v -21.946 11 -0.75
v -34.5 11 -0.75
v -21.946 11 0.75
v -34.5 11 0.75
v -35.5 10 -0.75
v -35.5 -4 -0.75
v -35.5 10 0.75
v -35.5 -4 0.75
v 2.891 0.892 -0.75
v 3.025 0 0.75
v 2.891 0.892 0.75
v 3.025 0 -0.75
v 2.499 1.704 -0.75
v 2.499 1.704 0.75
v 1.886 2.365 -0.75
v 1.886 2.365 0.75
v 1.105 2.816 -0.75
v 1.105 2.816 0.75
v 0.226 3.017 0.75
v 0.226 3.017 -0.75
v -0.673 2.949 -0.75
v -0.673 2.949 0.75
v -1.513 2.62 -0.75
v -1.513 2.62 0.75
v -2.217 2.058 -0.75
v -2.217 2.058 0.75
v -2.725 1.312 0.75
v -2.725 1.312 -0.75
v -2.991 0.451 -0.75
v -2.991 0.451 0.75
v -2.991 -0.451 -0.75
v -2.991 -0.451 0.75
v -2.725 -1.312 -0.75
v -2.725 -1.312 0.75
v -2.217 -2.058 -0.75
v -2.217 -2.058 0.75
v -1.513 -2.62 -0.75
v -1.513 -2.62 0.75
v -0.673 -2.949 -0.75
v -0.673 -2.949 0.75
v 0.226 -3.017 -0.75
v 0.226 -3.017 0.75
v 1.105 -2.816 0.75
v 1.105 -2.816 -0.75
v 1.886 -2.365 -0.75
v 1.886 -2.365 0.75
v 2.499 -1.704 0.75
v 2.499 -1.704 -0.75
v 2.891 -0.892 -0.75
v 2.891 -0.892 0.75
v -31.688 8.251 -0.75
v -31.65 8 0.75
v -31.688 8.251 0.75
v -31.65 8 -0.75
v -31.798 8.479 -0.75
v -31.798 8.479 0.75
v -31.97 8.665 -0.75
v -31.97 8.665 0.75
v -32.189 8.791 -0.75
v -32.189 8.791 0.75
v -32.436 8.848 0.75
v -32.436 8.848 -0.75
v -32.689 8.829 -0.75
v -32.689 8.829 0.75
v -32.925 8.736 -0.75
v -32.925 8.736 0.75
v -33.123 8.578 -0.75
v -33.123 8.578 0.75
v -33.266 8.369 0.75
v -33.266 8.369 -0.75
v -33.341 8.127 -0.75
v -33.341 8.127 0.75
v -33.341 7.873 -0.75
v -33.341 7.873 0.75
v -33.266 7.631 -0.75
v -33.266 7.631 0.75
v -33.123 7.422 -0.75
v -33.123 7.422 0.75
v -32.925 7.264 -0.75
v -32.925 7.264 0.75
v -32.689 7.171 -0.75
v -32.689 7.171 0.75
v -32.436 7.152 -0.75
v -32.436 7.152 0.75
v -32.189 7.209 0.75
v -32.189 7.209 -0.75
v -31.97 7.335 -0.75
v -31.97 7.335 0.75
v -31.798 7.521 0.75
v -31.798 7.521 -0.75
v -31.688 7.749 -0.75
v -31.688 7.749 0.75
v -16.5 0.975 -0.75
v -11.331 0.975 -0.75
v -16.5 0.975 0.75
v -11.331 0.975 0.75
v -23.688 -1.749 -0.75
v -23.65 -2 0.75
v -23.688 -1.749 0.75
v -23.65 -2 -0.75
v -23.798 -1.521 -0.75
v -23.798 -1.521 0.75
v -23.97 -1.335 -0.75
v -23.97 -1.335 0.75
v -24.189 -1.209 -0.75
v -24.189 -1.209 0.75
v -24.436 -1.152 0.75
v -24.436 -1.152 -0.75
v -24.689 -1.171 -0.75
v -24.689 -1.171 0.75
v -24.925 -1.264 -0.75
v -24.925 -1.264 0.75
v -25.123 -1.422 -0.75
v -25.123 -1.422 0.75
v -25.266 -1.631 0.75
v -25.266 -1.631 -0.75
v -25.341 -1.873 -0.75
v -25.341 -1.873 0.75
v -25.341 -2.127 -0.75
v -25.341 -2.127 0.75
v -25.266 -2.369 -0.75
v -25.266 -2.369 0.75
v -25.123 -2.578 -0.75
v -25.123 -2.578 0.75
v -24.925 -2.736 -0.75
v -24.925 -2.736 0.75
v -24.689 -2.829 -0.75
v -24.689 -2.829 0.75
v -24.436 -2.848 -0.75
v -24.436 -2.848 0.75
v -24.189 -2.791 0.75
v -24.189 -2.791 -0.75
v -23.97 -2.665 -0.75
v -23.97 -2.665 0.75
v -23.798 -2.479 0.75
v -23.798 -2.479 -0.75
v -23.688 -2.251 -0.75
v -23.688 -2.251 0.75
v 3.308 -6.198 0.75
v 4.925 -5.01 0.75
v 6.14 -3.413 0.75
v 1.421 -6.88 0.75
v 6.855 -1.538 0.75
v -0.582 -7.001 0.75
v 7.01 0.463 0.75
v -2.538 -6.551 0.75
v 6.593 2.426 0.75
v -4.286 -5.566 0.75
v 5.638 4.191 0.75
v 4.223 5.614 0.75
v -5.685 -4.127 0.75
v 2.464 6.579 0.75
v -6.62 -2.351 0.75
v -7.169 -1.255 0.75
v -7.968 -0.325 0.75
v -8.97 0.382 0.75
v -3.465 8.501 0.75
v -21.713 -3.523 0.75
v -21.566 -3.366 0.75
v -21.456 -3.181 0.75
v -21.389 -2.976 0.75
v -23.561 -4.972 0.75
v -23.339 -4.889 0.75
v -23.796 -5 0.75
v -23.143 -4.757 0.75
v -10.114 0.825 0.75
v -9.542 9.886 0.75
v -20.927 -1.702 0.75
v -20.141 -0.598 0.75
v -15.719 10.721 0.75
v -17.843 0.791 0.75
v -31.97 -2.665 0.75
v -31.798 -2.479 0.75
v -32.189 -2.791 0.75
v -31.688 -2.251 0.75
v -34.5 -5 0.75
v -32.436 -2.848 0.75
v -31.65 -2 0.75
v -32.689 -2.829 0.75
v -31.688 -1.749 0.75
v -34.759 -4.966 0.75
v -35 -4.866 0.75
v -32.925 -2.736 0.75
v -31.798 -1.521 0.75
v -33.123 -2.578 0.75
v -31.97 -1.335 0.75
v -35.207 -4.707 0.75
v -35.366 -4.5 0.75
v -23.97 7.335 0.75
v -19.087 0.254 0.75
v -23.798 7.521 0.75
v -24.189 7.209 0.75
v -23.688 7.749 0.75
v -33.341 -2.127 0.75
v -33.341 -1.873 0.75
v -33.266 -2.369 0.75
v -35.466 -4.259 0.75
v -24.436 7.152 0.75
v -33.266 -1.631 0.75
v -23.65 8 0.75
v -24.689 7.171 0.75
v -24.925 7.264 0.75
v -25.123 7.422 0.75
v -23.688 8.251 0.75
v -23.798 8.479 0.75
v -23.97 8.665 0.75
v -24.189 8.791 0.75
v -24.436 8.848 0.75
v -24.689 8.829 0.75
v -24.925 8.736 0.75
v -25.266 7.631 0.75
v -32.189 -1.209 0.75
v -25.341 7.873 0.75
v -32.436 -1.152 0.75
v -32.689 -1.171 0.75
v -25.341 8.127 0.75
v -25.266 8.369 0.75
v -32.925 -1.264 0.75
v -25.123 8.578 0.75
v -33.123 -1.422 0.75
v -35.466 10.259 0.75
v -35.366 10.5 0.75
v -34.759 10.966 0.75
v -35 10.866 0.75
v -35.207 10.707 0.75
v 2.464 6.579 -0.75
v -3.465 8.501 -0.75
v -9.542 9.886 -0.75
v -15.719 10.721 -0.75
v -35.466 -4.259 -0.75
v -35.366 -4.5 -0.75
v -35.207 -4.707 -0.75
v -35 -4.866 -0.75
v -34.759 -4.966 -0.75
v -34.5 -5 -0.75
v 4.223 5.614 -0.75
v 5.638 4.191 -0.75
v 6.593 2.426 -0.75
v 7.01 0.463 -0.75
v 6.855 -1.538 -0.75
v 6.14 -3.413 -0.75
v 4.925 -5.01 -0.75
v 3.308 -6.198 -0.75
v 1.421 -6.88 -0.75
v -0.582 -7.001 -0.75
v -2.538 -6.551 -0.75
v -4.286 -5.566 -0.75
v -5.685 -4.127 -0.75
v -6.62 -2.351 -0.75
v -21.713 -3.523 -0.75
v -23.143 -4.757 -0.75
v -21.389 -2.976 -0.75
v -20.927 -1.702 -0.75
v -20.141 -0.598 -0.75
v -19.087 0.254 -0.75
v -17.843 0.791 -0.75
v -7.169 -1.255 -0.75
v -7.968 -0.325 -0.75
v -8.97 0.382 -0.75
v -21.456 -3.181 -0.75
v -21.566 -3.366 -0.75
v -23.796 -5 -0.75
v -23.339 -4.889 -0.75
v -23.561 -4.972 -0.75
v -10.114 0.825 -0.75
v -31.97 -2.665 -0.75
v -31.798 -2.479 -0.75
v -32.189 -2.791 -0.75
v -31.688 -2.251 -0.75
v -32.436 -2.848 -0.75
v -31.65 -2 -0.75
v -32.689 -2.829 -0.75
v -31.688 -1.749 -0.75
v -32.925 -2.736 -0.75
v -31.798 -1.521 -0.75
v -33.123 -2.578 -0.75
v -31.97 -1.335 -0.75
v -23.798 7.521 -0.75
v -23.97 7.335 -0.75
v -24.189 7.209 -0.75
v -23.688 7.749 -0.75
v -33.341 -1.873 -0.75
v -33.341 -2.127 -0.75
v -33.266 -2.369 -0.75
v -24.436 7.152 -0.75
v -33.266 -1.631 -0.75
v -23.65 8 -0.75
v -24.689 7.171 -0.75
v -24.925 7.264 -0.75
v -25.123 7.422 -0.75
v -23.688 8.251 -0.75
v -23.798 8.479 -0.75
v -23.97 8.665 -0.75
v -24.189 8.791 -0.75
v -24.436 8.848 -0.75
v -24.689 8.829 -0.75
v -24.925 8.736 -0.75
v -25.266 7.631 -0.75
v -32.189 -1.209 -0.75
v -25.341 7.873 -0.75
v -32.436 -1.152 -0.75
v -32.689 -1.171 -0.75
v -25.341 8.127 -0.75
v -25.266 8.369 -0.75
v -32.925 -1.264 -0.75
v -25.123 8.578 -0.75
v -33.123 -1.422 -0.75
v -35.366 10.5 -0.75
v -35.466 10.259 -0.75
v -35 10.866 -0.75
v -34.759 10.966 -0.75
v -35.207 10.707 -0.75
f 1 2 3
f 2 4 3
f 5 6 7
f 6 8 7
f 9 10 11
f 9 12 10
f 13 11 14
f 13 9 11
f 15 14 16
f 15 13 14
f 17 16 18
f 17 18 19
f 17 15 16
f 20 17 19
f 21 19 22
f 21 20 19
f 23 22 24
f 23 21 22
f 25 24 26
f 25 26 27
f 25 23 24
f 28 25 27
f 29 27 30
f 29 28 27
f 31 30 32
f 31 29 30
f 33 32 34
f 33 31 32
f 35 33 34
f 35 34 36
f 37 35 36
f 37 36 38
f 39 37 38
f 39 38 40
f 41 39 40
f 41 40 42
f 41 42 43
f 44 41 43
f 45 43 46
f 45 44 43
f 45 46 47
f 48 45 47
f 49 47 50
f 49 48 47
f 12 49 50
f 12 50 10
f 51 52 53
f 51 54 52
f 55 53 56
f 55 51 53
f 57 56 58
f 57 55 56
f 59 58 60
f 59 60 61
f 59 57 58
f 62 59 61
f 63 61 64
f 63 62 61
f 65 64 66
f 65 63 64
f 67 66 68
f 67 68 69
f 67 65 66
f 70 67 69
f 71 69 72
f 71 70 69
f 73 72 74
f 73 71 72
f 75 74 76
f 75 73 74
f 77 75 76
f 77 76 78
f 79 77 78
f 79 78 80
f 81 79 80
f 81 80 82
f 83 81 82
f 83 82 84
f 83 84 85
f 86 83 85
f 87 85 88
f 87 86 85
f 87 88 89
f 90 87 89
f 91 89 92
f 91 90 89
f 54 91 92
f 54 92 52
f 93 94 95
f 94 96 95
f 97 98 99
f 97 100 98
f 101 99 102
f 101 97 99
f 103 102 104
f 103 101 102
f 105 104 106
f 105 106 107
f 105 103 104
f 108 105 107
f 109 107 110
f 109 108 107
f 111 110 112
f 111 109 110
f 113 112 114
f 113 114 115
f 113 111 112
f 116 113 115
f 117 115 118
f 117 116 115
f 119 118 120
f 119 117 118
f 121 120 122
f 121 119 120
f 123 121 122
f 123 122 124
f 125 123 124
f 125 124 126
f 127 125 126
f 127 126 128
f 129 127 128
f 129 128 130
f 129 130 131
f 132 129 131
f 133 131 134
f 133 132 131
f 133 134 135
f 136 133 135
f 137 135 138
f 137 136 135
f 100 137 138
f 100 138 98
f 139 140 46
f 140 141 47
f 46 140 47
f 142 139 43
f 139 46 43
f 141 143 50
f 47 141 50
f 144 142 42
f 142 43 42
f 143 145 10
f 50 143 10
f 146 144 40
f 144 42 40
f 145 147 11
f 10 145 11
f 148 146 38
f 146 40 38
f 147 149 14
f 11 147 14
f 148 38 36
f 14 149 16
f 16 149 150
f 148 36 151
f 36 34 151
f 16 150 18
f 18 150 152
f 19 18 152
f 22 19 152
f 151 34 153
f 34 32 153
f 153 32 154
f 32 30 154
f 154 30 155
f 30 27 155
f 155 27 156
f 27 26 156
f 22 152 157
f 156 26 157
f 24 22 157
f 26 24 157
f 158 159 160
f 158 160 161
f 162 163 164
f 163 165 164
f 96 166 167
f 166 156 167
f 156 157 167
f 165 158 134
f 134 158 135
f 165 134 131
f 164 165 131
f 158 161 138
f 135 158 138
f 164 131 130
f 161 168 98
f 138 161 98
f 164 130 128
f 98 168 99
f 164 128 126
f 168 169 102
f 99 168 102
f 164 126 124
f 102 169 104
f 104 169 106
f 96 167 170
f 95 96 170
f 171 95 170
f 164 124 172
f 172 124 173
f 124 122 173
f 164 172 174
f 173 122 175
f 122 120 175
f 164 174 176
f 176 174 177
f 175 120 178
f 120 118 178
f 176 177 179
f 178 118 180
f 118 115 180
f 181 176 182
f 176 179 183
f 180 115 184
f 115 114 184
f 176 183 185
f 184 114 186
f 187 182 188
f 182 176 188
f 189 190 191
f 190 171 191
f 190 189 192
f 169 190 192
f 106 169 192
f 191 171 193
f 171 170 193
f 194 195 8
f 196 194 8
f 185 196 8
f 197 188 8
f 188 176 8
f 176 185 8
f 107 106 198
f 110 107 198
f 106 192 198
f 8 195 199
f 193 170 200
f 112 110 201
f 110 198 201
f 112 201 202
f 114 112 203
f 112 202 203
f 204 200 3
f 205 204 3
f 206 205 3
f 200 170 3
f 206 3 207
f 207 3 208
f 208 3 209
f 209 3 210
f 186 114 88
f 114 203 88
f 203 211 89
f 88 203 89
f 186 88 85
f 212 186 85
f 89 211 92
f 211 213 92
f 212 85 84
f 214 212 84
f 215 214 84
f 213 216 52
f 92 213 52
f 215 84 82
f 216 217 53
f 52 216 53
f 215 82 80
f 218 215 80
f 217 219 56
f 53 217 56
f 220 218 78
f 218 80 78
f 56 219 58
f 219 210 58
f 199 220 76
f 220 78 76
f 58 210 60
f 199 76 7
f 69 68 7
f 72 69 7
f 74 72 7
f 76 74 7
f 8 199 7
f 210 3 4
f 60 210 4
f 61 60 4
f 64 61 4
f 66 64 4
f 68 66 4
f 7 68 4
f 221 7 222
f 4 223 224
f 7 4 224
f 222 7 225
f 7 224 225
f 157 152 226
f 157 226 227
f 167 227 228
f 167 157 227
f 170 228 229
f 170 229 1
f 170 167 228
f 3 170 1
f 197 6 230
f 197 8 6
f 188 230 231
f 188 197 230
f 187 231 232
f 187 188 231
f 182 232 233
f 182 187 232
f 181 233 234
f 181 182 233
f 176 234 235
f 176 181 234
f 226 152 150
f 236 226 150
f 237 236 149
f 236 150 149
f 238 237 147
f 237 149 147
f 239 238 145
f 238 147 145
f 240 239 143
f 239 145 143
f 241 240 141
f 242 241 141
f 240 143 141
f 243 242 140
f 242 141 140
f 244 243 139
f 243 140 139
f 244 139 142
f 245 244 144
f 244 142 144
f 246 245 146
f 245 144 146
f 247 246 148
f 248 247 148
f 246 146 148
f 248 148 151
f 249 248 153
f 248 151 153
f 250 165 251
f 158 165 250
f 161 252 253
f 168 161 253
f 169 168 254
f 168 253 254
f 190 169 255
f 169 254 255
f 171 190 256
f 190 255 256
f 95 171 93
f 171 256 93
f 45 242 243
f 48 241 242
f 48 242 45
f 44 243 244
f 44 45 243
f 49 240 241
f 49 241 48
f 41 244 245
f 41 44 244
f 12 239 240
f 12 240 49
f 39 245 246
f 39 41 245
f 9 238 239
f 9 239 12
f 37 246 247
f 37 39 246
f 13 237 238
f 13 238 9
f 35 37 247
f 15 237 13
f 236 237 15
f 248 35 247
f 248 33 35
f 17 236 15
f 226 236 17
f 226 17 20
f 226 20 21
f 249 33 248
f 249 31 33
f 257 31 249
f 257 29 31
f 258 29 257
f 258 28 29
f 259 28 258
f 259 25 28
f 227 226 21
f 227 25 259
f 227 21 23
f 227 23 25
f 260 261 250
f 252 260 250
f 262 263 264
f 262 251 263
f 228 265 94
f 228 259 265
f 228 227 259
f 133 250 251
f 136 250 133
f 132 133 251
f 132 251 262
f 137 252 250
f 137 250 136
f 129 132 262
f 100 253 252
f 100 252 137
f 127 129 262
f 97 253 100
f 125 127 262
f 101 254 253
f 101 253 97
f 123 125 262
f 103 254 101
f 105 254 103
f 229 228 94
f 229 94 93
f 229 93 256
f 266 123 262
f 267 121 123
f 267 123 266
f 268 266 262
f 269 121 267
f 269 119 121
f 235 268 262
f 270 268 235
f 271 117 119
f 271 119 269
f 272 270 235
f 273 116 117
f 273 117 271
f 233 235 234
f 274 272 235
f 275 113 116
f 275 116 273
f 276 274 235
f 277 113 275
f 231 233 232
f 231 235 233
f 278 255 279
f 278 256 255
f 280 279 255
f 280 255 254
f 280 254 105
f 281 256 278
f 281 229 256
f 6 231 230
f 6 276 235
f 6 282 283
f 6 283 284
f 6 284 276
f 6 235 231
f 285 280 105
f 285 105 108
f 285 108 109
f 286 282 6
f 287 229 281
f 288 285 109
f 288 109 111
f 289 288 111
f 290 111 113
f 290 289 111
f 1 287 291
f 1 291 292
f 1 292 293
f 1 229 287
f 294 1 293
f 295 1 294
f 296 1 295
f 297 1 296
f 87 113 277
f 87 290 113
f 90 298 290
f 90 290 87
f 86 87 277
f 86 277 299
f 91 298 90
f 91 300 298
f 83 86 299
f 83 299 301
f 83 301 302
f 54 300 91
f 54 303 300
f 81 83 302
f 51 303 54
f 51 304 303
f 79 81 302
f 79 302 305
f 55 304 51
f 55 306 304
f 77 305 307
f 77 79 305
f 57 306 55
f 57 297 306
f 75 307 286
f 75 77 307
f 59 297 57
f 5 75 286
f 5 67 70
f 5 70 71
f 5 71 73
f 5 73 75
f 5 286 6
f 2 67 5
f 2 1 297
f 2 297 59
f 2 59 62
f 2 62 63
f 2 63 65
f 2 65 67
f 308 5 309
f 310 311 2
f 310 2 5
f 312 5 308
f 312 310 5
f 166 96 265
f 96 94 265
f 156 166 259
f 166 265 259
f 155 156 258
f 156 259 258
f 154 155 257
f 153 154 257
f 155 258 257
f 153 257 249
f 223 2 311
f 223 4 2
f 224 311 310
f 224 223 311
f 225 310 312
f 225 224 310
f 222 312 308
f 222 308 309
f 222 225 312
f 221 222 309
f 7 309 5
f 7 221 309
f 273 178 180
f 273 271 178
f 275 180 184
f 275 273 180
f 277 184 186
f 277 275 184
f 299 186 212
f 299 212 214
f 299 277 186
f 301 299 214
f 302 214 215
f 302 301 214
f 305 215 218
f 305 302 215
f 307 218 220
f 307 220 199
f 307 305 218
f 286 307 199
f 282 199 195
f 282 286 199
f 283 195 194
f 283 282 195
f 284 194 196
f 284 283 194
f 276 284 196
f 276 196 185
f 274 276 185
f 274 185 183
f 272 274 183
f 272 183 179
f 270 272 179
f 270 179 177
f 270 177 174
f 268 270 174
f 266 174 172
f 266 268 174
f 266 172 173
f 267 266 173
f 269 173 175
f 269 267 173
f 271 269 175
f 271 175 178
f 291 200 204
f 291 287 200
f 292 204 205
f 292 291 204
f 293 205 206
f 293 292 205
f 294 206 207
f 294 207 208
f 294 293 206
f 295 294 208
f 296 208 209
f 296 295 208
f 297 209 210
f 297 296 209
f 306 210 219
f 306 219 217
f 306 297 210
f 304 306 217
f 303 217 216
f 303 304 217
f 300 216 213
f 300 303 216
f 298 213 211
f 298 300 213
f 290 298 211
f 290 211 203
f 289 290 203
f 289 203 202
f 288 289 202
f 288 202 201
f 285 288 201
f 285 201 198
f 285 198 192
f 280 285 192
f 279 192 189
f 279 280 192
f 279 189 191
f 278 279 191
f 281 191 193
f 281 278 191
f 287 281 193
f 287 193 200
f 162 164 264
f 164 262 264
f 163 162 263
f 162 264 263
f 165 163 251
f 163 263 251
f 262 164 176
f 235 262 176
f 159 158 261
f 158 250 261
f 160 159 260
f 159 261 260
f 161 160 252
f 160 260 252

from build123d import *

# Parameters (mm, degrees)
ESQUISSE1_R          = 3.025
ESQUISSE1_R_2        = 0.85
BOSS_EXTRU_1_DEPTH   = 0.75
CONG_1_R             = 5
CONG_2_R             = 1
CHANFREIN1_START     = -11.517439791
CHANFREIN1_OUTLINE_W = 6
CHANFREIN1_OUTLINE_H = 4
CHANFREIN1_DEPTH     = 2.517439791
CONG_3_R             = 1
BOSS_EXTRU_2_DEPTH   = 1.5


with BuildPart() as part:
    # Esquisse1 → Boss.-Extru.1 (new, symmetric)
    with BuildSketch(Plane.XY):
        with BuildLine():
            Line((-21.5, 11), (1.242174044, 6.914306086))
            ThreePointArc((1.242174044, 6.914306086), (4.121125954, -5.689195538), (-6.957010852, 0.975))
            Line((-6.957010852, 0.975), (-21.5, 0.975))
            Line((-21.5, 0.975), (-21.5, -5))
            Line((-21.5, -5), (-35.5, -5))
            Line((-35.5, -5), (-35.5, 11))
            Line((-35.5, 11), (-21.5, 11))
        make_face()
        Circle(ESQUISSE1_R, mode=Mode.SUBTRACT)
        with Locations((-32.5, 8)):
            Circle(ESQUISSE1_R_2, mode=Mode.SUBTRACT)
        with Locations((-24.5, 8)):
            Circle(ESQUISSE1_R_2, mode=Mode.SUBTRACT)
        with Locations((-24.5, -2)):
            Circle(ESQUISSE1_R_2, mode=Mode.SUBTRACT)
        with Locations((-32.5, -2)):
            Circle(ESQUISSE1_R_2, mode=Mode.SUBTRACT)
    extrude(amount=BOSS_EXTRU_1_DEPTH, both=True)

    # Congé1
    cong_1_edges = [part.edges().sort_by_distance(p)[0] for p in [
        (-21.5, 11, 0),
        (-6.957010852, 0.975, 0),
        (-21.5, 0.975, 0),
    ]]
    fillet(cong_1_edges, radius=CONG_1_R)

    # Congé2
    cong_2_edges = [part.edges().sort_by_distance(p)[0] for p in [
        (-35.5, 11, 0),
        (-35.5, -5, 0),
    ]]
    fillet(cong_2_edges, radius=CONG_2_R)

    # Chanfrein1: read off the stored shape, not the designer's step
    # Chanfrein1 outline → Chanfrein1 (cut)
    with BuildSketch(Plane(origin=(0, 0, 0), x_dir=(0.7571091636707948, 0.6532883852371091, 0), z_dir=(0.6532883852371091, -0.7571091636707951, 0)).offset(CHANFREIN1_START)):
        with Locations((-20, 0)):
            Rectangle(CHANFREIN1_OUTLINE_W, CHANFREIN1_OUTLINE_H)
    extrude(amount=CHANFREIN1_DEPTH, mode=Mode.SUBTRACT)

    # Congé3
    cong_3_edges = [part.edges().sort_by_distance(p)[0] for p in [
        (-21.44610623, -3.292857143, 0),
        (-23.424548722, -5, 0),
    ]]
    fillet(cong_3_edges, radius=CONG_3_R)

    # Esquisse2 → Boss.-Extru.2 (add)
    with BuildSketch(Plane.XY.offset(0.75)):
        with BuildLine():
            Line((-21.945565237, 11), (2.464036076, 6.578689171))
            ThreePointArc((2.464036076, 6.578689171), (-9.542172297, 9.885752111), (-21.945565237, 11))
        make_face()
    extrude(amount=-BOSS_EXTRU_2_DEPTH)


solid = part.part
